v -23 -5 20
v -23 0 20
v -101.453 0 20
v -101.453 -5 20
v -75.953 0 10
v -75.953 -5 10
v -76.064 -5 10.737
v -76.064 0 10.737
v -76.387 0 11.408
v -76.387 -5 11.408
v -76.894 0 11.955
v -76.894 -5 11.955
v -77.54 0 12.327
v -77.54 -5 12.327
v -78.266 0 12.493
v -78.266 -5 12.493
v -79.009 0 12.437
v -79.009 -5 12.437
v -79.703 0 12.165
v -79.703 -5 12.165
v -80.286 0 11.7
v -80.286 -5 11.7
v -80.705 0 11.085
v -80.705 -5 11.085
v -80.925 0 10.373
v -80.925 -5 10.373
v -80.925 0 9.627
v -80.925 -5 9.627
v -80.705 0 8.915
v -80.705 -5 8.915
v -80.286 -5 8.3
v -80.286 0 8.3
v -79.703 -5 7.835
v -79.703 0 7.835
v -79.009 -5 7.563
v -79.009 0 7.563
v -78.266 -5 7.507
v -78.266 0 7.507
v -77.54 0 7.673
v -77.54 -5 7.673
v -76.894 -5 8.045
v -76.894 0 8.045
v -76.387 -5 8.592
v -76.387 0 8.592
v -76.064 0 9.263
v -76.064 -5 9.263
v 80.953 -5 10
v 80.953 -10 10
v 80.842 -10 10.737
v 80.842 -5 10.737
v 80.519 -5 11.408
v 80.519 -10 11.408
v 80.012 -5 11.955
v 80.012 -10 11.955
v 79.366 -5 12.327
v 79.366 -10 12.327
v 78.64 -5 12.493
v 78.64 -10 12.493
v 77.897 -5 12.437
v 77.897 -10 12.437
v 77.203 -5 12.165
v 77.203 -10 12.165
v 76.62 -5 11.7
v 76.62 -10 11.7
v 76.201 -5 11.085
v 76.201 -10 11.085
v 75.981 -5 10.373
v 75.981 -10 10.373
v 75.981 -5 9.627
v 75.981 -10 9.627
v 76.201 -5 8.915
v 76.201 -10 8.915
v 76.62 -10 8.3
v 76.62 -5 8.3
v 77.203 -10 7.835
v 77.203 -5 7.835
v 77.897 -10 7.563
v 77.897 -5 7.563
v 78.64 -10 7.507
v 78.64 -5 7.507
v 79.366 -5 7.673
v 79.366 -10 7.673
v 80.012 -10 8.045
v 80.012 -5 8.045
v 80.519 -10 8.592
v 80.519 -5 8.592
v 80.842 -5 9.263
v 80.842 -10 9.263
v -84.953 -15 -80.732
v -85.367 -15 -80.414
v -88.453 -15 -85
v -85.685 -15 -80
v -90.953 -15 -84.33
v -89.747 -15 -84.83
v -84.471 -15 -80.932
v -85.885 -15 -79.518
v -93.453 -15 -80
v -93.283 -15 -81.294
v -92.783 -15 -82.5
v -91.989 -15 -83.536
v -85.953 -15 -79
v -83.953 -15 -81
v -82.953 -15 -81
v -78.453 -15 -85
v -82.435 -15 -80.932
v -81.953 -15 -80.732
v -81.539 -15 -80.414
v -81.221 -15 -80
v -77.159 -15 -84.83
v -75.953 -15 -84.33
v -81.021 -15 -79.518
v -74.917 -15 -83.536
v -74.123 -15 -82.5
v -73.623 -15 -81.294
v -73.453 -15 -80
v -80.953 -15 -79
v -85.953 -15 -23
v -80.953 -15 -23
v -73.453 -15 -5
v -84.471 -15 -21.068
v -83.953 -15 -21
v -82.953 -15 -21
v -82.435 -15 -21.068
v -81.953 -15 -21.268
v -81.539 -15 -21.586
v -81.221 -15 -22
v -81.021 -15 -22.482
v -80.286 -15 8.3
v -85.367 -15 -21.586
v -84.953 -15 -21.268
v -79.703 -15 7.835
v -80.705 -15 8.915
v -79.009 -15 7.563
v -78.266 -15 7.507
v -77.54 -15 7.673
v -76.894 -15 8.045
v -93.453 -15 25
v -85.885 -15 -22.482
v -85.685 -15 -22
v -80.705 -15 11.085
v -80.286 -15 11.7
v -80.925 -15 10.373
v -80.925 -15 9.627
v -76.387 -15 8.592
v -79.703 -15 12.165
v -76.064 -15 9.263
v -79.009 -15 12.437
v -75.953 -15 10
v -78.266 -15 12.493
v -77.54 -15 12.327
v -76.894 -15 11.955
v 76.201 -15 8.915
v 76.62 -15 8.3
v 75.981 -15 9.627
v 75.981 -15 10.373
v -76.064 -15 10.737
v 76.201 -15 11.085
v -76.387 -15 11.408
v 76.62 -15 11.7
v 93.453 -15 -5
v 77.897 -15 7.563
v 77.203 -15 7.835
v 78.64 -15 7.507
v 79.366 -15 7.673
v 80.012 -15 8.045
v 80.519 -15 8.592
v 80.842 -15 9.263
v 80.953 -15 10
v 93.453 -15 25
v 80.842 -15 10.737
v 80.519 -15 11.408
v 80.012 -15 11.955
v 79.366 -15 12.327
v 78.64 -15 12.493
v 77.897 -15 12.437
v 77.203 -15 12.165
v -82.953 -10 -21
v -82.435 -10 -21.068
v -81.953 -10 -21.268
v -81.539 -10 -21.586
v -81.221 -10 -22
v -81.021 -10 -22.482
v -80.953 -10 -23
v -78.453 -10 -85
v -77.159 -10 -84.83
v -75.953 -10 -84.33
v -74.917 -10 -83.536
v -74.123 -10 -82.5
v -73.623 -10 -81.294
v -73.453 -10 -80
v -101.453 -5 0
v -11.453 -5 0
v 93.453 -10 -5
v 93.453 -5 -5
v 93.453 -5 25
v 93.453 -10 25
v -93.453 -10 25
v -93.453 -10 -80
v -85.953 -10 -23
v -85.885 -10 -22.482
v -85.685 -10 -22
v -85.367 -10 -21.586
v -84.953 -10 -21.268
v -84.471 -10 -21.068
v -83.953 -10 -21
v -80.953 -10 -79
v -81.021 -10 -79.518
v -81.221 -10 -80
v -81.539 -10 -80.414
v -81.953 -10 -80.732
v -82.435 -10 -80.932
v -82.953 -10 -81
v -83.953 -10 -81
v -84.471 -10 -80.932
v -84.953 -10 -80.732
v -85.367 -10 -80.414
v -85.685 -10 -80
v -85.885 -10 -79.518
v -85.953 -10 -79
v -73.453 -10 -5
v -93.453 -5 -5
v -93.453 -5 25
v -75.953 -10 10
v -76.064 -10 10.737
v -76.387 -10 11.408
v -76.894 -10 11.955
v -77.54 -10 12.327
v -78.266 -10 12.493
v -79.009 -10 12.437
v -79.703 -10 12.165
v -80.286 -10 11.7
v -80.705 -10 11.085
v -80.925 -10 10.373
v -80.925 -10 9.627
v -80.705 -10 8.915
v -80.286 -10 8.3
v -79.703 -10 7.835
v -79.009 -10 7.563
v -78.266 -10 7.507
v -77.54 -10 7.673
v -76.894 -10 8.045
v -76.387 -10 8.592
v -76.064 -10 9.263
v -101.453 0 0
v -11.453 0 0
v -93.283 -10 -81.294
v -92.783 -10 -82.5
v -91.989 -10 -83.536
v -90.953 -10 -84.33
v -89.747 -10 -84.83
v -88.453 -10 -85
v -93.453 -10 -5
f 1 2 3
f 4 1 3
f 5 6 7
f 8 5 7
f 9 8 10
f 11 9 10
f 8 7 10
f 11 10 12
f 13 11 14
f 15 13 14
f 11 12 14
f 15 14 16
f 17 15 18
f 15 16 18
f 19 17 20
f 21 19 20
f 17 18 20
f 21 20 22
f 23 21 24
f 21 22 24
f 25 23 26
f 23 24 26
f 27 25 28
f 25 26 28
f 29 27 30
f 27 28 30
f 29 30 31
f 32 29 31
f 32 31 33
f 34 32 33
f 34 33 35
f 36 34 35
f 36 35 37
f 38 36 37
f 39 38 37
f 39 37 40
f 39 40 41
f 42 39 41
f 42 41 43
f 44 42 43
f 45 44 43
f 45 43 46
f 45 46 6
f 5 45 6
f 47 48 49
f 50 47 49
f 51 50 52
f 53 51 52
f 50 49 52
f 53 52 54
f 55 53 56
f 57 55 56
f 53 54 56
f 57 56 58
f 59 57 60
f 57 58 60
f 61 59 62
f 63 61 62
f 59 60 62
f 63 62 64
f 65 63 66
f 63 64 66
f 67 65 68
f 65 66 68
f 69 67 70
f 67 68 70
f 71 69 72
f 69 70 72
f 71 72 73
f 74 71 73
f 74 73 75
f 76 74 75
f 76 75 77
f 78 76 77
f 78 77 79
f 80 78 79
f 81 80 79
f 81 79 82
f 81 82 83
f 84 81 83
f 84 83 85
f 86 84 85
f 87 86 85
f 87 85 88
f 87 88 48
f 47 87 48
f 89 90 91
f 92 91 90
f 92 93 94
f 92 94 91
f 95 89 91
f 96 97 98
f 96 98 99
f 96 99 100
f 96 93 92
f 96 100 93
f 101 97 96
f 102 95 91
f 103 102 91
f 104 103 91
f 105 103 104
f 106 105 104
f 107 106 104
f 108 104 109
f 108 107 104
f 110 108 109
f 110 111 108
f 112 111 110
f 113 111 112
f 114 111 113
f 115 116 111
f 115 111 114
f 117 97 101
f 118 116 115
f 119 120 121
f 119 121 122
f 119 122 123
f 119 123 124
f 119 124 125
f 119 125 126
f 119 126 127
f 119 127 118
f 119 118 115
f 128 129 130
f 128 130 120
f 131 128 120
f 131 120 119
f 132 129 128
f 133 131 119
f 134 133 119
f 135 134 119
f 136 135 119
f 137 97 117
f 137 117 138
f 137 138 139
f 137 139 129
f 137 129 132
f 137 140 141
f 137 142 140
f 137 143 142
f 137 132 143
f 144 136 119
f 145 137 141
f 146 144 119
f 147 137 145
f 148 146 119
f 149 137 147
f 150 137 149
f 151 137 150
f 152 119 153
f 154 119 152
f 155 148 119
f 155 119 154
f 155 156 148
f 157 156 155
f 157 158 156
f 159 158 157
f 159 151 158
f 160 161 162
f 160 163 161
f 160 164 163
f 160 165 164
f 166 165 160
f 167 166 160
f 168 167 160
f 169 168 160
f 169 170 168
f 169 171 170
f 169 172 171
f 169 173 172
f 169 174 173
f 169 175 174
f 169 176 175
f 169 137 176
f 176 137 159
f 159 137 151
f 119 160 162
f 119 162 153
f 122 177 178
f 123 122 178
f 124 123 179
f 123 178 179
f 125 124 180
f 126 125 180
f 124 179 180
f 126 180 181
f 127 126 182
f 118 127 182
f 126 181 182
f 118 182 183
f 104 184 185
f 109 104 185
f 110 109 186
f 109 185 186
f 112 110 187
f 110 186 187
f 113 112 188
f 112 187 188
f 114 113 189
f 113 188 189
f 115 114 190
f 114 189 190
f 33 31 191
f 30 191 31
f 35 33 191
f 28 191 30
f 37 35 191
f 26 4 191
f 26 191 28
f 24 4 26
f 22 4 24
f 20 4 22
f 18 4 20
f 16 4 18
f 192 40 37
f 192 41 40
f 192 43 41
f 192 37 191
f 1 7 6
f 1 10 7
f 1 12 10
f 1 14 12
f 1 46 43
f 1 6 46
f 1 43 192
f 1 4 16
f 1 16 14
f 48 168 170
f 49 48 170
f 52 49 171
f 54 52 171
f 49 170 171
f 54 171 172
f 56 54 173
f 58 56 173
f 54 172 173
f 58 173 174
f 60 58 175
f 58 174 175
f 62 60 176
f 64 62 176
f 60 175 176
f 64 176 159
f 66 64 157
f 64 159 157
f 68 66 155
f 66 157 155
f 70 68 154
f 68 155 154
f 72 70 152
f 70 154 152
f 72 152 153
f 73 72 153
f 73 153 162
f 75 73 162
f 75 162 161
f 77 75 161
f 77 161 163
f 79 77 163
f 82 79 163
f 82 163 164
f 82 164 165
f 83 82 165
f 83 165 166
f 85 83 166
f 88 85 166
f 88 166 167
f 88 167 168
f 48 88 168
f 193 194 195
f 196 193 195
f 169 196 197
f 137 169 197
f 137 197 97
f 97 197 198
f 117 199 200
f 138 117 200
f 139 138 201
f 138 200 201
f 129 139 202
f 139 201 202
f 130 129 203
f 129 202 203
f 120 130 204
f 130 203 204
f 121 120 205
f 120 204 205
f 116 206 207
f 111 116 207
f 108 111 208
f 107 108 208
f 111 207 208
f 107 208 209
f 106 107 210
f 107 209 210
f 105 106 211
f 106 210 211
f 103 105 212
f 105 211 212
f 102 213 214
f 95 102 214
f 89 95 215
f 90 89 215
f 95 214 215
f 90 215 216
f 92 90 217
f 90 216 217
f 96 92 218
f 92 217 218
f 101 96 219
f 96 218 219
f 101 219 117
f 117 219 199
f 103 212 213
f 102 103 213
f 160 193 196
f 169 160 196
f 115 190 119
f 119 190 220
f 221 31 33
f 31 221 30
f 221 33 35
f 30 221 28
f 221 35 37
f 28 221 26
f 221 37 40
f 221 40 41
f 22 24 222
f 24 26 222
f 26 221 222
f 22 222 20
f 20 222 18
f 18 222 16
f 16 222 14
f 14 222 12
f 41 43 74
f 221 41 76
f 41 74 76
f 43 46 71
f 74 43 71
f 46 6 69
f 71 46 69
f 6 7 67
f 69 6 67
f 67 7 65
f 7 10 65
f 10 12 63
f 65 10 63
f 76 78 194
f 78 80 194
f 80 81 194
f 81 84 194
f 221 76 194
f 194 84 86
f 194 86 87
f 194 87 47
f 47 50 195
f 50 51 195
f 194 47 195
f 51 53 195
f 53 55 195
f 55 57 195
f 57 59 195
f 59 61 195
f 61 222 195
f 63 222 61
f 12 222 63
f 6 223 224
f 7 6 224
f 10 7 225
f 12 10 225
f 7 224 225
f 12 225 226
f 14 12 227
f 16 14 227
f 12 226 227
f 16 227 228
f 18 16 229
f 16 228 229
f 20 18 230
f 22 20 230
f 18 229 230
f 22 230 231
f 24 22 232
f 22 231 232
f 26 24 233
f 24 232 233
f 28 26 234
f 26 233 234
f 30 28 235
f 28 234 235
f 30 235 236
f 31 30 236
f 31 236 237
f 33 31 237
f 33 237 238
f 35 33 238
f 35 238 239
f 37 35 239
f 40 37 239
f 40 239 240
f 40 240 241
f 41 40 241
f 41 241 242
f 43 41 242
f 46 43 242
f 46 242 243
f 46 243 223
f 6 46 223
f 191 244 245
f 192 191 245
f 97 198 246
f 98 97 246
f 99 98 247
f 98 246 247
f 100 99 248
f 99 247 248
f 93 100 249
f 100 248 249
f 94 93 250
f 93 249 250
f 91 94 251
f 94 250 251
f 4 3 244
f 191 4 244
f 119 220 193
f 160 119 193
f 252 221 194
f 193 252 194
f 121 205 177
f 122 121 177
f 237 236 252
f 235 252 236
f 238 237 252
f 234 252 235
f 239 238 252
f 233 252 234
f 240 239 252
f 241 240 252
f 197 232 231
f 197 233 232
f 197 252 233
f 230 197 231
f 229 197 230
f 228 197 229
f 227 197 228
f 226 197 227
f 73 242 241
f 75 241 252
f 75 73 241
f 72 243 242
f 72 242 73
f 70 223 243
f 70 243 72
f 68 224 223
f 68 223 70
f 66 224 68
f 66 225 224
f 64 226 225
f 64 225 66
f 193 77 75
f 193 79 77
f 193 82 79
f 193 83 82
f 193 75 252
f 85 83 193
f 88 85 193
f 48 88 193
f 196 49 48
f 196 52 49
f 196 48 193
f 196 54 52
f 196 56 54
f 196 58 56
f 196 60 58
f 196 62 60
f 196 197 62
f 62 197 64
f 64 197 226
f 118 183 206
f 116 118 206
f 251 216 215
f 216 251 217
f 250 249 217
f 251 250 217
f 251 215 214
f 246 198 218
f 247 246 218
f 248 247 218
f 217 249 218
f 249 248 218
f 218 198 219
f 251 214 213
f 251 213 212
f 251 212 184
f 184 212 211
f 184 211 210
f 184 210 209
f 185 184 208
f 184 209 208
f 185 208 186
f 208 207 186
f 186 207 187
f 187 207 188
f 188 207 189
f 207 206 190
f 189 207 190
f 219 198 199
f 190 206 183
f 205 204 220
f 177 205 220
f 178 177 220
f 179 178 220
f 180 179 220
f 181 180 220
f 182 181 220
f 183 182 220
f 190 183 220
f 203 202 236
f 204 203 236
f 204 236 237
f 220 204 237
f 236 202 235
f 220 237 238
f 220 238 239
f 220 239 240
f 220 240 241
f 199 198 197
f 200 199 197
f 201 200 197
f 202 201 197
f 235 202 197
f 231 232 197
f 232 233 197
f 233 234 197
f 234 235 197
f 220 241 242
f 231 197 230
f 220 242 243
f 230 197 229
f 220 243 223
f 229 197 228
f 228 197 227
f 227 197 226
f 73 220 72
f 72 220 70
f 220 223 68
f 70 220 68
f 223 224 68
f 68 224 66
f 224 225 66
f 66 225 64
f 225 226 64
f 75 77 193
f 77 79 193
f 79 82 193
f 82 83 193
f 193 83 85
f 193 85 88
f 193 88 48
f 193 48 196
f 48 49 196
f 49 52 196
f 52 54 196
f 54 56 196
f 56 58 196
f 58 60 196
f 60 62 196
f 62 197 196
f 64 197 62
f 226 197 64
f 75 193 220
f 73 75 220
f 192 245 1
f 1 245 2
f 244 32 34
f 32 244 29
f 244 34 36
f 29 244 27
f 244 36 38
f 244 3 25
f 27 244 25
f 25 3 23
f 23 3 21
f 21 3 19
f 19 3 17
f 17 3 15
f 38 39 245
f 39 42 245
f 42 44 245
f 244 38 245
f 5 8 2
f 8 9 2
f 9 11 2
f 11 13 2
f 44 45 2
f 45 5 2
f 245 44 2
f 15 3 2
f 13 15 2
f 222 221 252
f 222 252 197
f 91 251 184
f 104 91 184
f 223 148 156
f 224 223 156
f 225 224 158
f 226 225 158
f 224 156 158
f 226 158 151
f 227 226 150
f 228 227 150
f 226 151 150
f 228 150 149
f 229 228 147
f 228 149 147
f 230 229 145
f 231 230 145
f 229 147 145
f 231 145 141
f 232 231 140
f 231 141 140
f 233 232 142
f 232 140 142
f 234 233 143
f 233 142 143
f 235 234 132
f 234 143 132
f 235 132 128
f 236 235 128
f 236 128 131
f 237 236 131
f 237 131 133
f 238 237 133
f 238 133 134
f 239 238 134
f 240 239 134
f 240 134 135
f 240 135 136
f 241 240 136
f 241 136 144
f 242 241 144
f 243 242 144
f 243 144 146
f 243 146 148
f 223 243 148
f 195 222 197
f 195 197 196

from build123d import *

# Parameters (mm, degrees)
F1_DEPTH = 5
F2_W     = 186.90599
F2_H     = 30
F3_DEPTH = 5
F5_DEPTH = 5
F6_R     = 2.5
F7_DEPTH = 15.001


with BuildPart() as f1:
    # F0 (on Front) → F1 (new body)
    with BuildSketch(Plane.XZ):
        Polygon((-101.452995, 20), (-101.452995, 0), (-11.452995, 0), (-23, 20), align=None)
    extrude(amount=F1_DEPTH)


with BuildPart() as f3:
    # F2 (on face) → F3 (new body)
    with BuildSketch(Plane.XZ.offset(5)):
        with Locations((0, 10)):
            Rectangle(F2_W, F2_H)
    extrude(amount=F3_DEPTH)


with BuildPart() as f5:
    # F4 (on face) → F5 (new body)
    with BuildSketch(Plane.XZ.offset(10)):
        Polygon((93.452995, 25), (-93.452995, 25), (-93.452995, -5), (-73.452995, -5), (93.452995, -5), align=None)
        with BuildLine():
            Line((-73.452995, -5), (-93.452995, -5))
            Line((-93.452995, -5), (-93.452995, -80))
            ThreePointArc((-93.452995, -80), (-91.988529, -83.535534), (-88.452995, -85))
            Line((-88.452995, -85), (-78.452995, -85))
            ThreePointArc((-78.452995, -85), (-74.917461, -83.535534), (-73.452995, -80))
            Line((-73.452995, -80), (-73.452995, -5))
        make_face()
        with BuildLine():
            Line((-83.952995, -21), (-82.952995, -21))
            ThreePointArc((-82.952995, -21), (-81.538781, -21.585786), (-80.952995, -23))
            Line((-80.952995, -23), (-80.952995, -79))
            ThreePointArc((-80.952995, -79), (-81.538781, -80.414214), (-82.952995, -81))
            Line((-82.952995, -81), (-83.952995, -81))
            ThreePointArc((-83.952995, -81), (-85.367208, -80.414214), (-85.952995, -79))
            Line((-85.952995, -79), (-85.952995, -23))
            ThreePointArc((-85.952995, -23), (-85.367208, -21.585786), (-83.952995, -21))
        make_face(mode=Mode.SUBTRACT)
    extrude(amount=F5_DEPTH)


with BuildPart() as f7_tool:
    # F6 (on face) → F7 (new body, through all)
    with BuildSketch(Plane.XZ.offset(15)):
        with Locations((-78.452995, 10)):
            Circle(F6_R)
        with Locations((78.452995, 10)):
            Circle(F6_R)
    extrude(amount=-F7_DEPTH)


with BuildPart() as f1_1:
    add(f1.part)

    # F7: cut by f7_tool
    add(f7_tool.part, mode=Mode.SUBTRACT)


with BuildPart() as f3_1:
    add(f3.part)

    # F7: cut by f7_tool
    add(f7_tool.part, mode=Mode.SUBTRACT)


with BuildPart() as f5_1:
    add(f5.part)

    # F7: cut by f7_tool
    add(f7_tool.part, mode=Mode.SUBTRACT)


solid = Compound([f1_1.part, f3_1.part, f5_1.part])
